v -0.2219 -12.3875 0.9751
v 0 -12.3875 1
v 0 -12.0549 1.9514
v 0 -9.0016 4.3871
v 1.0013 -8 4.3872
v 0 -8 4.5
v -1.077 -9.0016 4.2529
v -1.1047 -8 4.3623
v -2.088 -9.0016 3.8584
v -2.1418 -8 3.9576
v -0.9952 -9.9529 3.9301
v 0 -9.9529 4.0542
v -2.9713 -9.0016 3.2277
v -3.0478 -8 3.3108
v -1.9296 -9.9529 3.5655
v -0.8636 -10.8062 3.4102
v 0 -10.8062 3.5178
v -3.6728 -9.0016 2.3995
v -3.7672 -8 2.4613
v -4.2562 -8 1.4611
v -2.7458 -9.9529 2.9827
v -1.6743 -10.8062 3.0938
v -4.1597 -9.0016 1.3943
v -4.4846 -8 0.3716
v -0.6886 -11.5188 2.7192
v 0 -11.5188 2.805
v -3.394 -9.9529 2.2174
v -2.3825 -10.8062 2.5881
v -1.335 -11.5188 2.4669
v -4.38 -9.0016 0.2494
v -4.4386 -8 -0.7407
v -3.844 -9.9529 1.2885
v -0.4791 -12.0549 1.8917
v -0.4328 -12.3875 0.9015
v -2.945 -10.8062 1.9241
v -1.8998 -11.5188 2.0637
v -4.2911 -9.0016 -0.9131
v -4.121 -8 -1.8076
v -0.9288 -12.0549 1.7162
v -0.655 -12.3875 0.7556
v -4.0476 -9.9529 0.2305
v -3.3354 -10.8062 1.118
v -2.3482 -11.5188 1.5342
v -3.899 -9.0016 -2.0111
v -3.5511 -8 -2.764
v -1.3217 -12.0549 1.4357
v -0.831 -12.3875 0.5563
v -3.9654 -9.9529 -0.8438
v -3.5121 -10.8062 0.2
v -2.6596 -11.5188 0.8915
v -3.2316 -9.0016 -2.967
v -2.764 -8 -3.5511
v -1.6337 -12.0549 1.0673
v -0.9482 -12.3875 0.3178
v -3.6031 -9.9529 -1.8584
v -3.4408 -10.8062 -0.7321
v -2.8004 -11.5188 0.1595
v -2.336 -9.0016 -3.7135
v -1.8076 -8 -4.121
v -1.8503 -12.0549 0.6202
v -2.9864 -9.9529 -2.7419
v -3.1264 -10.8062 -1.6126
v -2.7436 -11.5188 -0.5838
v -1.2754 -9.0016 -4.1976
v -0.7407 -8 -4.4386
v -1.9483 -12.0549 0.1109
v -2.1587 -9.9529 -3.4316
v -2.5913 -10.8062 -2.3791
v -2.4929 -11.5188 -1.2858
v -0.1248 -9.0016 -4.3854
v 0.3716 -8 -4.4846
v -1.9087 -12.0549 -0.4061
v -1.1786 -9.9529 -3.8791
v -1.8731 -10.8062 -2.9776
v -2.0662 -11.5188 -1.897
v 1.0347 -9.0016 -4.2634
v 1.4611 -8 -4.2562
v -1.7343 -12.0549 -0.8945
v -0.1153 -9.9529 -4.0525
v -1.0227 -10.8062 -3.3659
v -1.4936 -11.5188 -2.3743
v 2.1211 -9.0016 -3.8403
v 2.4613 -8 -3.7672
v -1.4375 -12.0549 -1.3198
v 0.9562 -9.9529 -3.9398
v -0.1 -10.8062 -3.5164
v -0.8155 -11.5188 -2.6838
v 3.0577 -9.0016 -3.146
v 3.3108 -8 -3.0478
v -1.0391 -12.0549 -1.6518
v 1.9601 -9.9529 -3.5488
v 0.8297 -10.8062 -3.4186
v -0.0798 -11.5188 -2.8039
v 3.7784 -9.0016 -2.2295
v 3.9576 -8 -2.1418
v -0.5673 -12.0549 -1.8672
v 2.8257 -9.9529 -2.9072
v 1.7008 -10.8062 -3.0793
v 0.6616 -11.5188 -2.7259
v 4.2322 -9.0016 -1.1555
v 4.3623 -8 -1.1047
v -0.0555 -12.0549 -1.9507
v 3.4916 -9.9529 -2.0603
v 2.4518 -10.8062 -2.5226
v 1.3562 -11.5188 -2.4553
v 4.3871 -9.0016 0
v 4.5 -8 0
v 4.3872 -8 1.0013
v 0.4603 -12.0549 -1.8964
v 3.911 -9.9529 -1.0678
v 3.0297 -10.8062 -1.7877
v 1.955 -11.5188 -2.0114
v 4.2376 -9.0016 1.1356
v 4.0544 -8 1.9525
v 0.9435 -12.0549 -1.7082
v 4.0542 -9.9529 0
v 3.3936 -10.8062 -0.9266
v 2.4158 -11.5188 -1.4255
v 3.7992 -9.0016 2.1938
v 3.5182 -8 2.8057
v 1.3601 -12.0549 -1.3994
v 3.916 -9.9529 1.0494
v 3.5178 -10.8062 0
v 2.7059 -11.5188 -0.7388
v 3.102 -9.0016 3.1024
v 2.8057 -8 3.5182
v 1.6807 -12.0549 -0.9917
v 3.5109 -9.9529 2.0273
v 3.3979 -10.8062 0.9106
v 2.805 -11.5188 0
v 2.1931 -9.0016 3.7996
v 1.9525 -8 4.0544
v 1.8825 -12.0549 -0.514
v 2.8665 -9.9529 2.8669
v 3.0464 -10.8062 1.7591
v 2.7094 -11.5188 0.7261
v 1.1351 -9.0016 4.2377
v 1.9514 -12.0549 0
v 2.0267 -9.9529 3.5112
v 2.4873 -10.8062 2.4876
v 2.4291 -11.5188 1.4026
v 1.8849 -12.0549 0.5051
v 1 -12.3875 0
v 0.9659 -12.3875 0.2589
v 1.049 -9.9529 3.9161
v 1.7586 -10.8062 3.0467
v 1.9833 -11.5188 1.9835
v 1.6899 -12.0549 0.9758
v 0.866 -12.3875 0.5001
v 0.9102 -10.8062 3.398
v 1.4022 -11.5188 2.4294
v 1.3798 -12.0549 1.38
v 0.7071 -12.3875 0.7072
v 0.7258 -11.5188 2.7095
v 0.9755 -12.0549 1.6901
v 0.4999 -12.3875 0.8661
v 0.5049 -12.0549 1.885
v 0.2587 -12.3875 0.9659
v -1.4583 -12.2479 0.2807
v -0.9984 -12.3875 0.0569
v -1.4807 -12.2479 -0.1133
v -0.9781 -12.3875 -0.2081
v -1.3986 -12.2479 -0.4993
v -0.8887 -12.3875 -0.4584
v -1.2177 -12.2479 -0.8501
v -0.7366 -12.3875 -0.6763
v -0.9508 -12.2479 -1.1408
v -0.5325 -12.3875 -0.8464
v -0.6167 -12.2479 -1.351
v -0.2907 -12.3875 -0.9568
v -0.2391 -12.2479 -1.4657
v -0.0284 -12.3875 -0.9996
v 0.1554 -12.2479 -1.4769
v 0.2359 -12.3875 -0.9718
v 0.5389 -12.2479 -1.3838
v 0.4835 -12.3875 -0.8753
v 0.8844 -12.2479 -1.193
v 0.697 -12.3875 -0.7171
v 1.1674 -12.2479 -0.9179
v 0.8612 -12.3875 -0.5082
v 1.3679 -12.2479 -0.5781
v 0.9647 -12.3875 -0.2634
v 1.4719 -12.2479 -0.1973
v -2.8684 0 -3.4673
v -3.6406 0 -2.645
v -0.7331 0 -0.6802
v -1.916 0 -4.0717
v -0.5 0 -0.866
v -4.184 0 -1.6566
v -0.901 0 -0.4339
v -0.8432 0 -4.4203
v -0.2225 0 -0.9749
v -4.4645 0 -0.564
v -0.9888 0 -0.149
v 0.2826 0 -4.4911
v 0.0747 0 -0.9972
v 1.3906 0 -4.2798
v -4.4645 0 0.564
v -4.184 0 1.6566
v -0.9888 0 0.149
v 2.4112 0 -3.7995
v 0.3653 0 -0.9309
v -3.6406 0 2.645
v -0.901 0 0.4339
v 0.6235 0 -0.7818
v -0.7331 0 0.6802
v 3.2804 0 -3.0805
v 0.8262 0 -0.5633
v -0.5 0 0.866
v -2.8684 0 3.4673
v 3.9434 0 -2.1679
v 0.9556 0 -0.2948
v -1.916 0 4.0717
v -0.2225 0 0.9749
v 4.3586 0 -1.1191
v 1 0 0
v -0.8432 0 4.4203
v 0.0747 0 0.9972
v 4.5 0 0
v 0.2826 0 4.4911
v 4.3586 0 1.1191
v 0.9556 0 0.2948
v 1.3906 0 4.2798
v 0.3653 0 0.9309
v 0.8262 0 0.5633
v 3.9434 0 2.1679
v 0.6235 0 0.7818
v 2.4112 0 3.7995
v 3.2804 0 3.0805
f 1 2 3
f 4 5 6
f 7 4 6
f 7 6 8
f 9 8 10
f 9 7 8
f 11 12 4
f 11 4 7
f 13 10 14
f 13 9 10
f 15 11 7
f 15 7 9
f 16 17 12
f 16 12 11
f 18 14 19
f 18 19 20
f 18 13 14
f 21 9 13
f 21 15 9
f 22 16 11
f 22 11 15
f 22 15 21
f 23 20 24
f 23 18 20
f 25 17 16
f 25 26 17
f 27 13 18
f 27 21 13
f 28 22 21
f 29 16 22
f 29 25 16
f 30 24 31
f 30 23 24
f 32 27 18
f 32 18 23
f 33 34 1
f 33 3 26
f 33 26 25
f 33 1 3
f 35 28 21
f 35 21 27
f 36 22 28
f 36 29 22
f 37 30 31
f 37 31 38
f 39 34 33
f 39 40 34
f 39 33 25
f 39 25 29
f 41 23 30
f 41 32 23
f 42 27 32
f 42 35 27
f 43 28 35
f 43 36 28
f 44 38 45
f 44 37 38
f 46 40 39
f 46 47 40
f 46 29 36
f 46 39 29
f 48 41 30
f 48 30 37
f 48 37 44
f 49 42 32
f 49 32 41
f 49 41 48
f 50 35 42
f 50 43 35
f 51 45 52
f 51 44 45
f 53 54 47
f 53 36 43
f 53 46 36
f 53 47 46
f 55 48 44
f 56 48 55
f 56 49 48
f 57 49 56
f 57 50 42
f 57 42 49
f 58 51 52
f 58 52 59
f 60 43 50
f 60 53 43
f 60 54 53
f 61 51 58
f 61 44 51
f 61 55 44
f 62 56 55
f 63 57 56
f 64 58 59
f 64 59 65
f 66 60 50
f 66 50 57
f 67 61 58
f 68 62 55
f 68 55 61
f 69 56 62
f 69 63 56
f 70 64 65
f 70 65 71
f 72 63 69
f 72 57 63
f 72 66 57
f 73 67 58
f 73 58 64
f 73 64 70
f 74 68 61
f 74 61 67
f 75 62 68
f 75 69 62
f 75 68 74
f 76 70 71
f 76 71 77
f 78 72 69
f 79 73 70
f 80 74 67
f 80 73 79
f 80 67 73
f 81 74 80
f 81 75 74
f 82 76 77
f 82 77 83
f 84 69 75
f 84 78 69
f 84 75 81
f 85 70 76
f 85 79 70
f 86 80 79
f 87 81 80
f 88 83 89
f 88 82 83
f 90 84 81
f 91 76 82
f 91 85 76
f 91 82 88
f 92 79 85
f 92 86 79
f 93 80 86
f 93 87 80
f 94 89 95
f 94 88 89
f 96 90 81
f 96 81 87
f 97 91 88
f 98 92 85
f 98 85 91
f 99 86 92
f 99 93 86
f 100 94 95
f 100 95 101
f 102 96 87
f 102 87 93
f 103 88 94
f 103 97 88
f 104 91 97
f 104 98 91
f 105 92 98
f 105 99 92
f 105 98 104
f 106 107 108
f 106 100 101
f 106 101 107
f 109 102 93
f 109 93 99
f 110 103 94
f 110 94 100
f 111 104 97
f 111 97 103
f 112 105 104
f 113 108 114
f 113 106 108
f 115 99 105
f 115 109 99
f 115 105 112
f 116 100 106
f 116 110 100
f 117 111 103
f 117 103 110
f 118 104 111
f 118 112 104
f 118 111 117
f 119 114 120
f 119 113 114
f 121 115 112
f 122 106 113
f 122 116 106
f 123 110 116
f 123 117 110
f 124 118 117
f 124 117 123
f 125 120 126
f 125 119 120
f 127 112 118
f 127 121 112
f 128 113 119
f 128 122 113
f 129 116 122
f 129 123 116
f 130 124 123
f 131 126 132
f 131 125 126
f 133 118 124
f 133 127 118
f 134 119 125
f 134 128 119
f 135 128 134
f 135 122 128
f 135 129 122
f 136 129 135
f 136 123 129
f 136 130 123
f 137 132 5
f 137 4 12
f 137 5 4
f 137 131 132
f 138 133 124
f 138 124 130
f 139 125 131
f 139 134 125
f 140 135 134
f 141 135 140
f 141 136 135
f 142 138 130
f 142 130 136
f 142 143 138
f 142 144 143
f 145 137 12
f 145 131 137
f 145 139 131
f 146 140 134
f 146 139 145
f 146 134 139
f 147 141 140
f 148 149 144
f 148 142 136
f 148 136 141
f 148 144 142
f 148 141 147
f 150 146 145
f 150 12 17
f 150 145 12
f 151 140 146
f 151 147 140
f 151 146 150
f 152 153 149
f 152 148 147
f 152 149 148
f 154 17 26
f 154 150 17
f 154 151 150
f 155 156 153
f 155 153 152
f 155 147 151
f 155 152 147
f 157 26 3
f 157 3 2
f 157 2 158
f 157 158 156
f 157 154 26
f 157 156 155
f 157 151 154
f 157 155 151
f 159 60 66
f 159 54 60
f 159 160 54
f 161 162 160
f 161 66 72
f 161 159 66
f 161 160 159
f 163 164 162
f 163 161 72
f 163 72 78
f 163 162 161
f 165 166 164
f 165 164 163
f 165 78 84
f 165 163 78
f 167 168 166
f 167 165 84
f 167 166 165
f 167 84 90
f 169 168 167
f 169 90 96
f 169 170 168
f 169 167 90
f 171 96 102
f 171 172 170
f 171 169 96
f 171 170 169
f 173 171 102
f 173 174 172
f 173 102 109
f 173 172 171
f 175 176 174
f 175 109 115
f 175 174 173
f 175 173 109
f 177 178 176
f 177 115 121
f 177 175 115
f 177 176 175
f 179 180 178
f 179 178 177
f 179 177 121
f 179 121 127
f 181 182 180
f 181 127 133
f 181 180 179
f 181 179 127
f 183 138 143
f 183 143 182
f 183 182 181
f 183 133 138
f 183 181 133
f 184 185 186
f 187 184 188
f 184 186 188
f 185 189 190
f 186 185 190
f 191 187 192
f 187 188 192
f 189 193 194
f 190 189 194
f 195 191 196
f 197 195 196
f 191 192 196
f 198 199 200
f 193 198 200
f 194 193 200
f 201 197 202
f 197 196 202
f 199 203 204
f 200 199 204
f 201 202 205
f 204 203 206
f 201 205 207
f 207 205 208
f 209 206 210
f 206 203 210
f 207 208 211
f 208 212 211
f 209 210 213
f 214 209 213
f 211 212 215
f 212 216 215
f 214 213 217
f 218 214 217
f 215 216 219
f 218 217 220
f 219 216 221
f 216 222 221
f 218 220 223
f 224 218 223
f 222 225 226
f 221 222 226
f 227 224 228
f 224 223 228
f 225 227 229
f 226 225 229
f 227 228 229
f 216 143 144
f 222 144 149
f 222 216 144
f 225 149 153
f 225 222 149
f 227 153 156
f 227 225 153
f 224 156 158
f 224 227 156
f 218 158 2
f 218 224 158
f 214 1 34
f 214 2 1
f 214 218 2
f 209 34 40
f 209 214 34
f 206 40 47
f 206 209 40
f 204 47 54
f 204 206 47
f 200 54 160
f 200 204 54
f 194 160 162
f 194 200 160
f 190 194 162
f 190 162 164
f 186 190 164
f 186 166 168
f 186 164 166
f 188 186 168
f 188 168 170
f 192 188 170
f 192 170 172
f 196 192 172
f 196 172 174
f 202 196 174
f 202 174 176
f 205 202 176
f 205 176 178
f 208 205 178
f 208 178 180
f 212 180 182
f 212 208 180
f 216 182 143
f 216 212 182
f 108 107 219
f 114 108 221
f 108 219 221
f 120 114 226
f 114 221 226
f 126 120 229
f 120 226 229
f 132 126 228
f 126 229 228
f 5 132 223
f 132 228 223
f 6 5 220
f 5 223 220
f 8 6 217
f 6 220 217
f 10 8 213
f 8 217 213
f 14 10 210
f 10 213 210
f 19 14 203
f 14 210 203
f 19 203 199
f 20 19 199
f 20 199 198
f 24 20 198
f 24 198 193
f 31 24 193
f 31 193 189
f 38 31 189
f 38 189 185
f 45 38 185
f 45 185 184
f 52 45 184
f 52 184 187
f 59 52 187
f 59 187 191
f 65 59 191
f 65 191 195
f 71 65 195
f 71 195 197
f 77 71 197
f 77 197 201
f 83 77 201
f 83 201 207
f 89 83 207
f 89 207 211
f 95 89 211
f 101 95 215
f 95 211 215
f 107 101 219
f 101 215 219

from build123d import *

# Parameters (mm, degrees)
F0_R     = 4.5
F1_DEPTH = 8
F4_R     = 1
F5_DEPTH = 12.501


with BuildPart() as f1:
    # F0 (on Front) → F1 (new body)
    with BuildSketch(Plane.XZ):
        Circle(F0_R)
    extrude(amount=F1_DEPTH)

    # F2 (on Right) → F3 (revolve)
    with BuildSketch(Plane.YZ):
        with BuildLine():
            Line((-8, 0), (-8, 4.5))
            ThreePointArc((-8, 4.5), (-11.181981, 3.181981), (-12.5, 0))
            Line((-12.5, 0), (-8, 0))
        make_face()
    revolve(axis=Axis((0, -26.326631, 0), (0, -1, 0)))

    # F4 (on Front) → F5 (cut, through all)
    with BuildSketch(Plane.XZ):
        Circle(F4_R)
    extrude(amount=F5_DEPTH, mode=Mode.SUBTRACT)


solid = f1.part
